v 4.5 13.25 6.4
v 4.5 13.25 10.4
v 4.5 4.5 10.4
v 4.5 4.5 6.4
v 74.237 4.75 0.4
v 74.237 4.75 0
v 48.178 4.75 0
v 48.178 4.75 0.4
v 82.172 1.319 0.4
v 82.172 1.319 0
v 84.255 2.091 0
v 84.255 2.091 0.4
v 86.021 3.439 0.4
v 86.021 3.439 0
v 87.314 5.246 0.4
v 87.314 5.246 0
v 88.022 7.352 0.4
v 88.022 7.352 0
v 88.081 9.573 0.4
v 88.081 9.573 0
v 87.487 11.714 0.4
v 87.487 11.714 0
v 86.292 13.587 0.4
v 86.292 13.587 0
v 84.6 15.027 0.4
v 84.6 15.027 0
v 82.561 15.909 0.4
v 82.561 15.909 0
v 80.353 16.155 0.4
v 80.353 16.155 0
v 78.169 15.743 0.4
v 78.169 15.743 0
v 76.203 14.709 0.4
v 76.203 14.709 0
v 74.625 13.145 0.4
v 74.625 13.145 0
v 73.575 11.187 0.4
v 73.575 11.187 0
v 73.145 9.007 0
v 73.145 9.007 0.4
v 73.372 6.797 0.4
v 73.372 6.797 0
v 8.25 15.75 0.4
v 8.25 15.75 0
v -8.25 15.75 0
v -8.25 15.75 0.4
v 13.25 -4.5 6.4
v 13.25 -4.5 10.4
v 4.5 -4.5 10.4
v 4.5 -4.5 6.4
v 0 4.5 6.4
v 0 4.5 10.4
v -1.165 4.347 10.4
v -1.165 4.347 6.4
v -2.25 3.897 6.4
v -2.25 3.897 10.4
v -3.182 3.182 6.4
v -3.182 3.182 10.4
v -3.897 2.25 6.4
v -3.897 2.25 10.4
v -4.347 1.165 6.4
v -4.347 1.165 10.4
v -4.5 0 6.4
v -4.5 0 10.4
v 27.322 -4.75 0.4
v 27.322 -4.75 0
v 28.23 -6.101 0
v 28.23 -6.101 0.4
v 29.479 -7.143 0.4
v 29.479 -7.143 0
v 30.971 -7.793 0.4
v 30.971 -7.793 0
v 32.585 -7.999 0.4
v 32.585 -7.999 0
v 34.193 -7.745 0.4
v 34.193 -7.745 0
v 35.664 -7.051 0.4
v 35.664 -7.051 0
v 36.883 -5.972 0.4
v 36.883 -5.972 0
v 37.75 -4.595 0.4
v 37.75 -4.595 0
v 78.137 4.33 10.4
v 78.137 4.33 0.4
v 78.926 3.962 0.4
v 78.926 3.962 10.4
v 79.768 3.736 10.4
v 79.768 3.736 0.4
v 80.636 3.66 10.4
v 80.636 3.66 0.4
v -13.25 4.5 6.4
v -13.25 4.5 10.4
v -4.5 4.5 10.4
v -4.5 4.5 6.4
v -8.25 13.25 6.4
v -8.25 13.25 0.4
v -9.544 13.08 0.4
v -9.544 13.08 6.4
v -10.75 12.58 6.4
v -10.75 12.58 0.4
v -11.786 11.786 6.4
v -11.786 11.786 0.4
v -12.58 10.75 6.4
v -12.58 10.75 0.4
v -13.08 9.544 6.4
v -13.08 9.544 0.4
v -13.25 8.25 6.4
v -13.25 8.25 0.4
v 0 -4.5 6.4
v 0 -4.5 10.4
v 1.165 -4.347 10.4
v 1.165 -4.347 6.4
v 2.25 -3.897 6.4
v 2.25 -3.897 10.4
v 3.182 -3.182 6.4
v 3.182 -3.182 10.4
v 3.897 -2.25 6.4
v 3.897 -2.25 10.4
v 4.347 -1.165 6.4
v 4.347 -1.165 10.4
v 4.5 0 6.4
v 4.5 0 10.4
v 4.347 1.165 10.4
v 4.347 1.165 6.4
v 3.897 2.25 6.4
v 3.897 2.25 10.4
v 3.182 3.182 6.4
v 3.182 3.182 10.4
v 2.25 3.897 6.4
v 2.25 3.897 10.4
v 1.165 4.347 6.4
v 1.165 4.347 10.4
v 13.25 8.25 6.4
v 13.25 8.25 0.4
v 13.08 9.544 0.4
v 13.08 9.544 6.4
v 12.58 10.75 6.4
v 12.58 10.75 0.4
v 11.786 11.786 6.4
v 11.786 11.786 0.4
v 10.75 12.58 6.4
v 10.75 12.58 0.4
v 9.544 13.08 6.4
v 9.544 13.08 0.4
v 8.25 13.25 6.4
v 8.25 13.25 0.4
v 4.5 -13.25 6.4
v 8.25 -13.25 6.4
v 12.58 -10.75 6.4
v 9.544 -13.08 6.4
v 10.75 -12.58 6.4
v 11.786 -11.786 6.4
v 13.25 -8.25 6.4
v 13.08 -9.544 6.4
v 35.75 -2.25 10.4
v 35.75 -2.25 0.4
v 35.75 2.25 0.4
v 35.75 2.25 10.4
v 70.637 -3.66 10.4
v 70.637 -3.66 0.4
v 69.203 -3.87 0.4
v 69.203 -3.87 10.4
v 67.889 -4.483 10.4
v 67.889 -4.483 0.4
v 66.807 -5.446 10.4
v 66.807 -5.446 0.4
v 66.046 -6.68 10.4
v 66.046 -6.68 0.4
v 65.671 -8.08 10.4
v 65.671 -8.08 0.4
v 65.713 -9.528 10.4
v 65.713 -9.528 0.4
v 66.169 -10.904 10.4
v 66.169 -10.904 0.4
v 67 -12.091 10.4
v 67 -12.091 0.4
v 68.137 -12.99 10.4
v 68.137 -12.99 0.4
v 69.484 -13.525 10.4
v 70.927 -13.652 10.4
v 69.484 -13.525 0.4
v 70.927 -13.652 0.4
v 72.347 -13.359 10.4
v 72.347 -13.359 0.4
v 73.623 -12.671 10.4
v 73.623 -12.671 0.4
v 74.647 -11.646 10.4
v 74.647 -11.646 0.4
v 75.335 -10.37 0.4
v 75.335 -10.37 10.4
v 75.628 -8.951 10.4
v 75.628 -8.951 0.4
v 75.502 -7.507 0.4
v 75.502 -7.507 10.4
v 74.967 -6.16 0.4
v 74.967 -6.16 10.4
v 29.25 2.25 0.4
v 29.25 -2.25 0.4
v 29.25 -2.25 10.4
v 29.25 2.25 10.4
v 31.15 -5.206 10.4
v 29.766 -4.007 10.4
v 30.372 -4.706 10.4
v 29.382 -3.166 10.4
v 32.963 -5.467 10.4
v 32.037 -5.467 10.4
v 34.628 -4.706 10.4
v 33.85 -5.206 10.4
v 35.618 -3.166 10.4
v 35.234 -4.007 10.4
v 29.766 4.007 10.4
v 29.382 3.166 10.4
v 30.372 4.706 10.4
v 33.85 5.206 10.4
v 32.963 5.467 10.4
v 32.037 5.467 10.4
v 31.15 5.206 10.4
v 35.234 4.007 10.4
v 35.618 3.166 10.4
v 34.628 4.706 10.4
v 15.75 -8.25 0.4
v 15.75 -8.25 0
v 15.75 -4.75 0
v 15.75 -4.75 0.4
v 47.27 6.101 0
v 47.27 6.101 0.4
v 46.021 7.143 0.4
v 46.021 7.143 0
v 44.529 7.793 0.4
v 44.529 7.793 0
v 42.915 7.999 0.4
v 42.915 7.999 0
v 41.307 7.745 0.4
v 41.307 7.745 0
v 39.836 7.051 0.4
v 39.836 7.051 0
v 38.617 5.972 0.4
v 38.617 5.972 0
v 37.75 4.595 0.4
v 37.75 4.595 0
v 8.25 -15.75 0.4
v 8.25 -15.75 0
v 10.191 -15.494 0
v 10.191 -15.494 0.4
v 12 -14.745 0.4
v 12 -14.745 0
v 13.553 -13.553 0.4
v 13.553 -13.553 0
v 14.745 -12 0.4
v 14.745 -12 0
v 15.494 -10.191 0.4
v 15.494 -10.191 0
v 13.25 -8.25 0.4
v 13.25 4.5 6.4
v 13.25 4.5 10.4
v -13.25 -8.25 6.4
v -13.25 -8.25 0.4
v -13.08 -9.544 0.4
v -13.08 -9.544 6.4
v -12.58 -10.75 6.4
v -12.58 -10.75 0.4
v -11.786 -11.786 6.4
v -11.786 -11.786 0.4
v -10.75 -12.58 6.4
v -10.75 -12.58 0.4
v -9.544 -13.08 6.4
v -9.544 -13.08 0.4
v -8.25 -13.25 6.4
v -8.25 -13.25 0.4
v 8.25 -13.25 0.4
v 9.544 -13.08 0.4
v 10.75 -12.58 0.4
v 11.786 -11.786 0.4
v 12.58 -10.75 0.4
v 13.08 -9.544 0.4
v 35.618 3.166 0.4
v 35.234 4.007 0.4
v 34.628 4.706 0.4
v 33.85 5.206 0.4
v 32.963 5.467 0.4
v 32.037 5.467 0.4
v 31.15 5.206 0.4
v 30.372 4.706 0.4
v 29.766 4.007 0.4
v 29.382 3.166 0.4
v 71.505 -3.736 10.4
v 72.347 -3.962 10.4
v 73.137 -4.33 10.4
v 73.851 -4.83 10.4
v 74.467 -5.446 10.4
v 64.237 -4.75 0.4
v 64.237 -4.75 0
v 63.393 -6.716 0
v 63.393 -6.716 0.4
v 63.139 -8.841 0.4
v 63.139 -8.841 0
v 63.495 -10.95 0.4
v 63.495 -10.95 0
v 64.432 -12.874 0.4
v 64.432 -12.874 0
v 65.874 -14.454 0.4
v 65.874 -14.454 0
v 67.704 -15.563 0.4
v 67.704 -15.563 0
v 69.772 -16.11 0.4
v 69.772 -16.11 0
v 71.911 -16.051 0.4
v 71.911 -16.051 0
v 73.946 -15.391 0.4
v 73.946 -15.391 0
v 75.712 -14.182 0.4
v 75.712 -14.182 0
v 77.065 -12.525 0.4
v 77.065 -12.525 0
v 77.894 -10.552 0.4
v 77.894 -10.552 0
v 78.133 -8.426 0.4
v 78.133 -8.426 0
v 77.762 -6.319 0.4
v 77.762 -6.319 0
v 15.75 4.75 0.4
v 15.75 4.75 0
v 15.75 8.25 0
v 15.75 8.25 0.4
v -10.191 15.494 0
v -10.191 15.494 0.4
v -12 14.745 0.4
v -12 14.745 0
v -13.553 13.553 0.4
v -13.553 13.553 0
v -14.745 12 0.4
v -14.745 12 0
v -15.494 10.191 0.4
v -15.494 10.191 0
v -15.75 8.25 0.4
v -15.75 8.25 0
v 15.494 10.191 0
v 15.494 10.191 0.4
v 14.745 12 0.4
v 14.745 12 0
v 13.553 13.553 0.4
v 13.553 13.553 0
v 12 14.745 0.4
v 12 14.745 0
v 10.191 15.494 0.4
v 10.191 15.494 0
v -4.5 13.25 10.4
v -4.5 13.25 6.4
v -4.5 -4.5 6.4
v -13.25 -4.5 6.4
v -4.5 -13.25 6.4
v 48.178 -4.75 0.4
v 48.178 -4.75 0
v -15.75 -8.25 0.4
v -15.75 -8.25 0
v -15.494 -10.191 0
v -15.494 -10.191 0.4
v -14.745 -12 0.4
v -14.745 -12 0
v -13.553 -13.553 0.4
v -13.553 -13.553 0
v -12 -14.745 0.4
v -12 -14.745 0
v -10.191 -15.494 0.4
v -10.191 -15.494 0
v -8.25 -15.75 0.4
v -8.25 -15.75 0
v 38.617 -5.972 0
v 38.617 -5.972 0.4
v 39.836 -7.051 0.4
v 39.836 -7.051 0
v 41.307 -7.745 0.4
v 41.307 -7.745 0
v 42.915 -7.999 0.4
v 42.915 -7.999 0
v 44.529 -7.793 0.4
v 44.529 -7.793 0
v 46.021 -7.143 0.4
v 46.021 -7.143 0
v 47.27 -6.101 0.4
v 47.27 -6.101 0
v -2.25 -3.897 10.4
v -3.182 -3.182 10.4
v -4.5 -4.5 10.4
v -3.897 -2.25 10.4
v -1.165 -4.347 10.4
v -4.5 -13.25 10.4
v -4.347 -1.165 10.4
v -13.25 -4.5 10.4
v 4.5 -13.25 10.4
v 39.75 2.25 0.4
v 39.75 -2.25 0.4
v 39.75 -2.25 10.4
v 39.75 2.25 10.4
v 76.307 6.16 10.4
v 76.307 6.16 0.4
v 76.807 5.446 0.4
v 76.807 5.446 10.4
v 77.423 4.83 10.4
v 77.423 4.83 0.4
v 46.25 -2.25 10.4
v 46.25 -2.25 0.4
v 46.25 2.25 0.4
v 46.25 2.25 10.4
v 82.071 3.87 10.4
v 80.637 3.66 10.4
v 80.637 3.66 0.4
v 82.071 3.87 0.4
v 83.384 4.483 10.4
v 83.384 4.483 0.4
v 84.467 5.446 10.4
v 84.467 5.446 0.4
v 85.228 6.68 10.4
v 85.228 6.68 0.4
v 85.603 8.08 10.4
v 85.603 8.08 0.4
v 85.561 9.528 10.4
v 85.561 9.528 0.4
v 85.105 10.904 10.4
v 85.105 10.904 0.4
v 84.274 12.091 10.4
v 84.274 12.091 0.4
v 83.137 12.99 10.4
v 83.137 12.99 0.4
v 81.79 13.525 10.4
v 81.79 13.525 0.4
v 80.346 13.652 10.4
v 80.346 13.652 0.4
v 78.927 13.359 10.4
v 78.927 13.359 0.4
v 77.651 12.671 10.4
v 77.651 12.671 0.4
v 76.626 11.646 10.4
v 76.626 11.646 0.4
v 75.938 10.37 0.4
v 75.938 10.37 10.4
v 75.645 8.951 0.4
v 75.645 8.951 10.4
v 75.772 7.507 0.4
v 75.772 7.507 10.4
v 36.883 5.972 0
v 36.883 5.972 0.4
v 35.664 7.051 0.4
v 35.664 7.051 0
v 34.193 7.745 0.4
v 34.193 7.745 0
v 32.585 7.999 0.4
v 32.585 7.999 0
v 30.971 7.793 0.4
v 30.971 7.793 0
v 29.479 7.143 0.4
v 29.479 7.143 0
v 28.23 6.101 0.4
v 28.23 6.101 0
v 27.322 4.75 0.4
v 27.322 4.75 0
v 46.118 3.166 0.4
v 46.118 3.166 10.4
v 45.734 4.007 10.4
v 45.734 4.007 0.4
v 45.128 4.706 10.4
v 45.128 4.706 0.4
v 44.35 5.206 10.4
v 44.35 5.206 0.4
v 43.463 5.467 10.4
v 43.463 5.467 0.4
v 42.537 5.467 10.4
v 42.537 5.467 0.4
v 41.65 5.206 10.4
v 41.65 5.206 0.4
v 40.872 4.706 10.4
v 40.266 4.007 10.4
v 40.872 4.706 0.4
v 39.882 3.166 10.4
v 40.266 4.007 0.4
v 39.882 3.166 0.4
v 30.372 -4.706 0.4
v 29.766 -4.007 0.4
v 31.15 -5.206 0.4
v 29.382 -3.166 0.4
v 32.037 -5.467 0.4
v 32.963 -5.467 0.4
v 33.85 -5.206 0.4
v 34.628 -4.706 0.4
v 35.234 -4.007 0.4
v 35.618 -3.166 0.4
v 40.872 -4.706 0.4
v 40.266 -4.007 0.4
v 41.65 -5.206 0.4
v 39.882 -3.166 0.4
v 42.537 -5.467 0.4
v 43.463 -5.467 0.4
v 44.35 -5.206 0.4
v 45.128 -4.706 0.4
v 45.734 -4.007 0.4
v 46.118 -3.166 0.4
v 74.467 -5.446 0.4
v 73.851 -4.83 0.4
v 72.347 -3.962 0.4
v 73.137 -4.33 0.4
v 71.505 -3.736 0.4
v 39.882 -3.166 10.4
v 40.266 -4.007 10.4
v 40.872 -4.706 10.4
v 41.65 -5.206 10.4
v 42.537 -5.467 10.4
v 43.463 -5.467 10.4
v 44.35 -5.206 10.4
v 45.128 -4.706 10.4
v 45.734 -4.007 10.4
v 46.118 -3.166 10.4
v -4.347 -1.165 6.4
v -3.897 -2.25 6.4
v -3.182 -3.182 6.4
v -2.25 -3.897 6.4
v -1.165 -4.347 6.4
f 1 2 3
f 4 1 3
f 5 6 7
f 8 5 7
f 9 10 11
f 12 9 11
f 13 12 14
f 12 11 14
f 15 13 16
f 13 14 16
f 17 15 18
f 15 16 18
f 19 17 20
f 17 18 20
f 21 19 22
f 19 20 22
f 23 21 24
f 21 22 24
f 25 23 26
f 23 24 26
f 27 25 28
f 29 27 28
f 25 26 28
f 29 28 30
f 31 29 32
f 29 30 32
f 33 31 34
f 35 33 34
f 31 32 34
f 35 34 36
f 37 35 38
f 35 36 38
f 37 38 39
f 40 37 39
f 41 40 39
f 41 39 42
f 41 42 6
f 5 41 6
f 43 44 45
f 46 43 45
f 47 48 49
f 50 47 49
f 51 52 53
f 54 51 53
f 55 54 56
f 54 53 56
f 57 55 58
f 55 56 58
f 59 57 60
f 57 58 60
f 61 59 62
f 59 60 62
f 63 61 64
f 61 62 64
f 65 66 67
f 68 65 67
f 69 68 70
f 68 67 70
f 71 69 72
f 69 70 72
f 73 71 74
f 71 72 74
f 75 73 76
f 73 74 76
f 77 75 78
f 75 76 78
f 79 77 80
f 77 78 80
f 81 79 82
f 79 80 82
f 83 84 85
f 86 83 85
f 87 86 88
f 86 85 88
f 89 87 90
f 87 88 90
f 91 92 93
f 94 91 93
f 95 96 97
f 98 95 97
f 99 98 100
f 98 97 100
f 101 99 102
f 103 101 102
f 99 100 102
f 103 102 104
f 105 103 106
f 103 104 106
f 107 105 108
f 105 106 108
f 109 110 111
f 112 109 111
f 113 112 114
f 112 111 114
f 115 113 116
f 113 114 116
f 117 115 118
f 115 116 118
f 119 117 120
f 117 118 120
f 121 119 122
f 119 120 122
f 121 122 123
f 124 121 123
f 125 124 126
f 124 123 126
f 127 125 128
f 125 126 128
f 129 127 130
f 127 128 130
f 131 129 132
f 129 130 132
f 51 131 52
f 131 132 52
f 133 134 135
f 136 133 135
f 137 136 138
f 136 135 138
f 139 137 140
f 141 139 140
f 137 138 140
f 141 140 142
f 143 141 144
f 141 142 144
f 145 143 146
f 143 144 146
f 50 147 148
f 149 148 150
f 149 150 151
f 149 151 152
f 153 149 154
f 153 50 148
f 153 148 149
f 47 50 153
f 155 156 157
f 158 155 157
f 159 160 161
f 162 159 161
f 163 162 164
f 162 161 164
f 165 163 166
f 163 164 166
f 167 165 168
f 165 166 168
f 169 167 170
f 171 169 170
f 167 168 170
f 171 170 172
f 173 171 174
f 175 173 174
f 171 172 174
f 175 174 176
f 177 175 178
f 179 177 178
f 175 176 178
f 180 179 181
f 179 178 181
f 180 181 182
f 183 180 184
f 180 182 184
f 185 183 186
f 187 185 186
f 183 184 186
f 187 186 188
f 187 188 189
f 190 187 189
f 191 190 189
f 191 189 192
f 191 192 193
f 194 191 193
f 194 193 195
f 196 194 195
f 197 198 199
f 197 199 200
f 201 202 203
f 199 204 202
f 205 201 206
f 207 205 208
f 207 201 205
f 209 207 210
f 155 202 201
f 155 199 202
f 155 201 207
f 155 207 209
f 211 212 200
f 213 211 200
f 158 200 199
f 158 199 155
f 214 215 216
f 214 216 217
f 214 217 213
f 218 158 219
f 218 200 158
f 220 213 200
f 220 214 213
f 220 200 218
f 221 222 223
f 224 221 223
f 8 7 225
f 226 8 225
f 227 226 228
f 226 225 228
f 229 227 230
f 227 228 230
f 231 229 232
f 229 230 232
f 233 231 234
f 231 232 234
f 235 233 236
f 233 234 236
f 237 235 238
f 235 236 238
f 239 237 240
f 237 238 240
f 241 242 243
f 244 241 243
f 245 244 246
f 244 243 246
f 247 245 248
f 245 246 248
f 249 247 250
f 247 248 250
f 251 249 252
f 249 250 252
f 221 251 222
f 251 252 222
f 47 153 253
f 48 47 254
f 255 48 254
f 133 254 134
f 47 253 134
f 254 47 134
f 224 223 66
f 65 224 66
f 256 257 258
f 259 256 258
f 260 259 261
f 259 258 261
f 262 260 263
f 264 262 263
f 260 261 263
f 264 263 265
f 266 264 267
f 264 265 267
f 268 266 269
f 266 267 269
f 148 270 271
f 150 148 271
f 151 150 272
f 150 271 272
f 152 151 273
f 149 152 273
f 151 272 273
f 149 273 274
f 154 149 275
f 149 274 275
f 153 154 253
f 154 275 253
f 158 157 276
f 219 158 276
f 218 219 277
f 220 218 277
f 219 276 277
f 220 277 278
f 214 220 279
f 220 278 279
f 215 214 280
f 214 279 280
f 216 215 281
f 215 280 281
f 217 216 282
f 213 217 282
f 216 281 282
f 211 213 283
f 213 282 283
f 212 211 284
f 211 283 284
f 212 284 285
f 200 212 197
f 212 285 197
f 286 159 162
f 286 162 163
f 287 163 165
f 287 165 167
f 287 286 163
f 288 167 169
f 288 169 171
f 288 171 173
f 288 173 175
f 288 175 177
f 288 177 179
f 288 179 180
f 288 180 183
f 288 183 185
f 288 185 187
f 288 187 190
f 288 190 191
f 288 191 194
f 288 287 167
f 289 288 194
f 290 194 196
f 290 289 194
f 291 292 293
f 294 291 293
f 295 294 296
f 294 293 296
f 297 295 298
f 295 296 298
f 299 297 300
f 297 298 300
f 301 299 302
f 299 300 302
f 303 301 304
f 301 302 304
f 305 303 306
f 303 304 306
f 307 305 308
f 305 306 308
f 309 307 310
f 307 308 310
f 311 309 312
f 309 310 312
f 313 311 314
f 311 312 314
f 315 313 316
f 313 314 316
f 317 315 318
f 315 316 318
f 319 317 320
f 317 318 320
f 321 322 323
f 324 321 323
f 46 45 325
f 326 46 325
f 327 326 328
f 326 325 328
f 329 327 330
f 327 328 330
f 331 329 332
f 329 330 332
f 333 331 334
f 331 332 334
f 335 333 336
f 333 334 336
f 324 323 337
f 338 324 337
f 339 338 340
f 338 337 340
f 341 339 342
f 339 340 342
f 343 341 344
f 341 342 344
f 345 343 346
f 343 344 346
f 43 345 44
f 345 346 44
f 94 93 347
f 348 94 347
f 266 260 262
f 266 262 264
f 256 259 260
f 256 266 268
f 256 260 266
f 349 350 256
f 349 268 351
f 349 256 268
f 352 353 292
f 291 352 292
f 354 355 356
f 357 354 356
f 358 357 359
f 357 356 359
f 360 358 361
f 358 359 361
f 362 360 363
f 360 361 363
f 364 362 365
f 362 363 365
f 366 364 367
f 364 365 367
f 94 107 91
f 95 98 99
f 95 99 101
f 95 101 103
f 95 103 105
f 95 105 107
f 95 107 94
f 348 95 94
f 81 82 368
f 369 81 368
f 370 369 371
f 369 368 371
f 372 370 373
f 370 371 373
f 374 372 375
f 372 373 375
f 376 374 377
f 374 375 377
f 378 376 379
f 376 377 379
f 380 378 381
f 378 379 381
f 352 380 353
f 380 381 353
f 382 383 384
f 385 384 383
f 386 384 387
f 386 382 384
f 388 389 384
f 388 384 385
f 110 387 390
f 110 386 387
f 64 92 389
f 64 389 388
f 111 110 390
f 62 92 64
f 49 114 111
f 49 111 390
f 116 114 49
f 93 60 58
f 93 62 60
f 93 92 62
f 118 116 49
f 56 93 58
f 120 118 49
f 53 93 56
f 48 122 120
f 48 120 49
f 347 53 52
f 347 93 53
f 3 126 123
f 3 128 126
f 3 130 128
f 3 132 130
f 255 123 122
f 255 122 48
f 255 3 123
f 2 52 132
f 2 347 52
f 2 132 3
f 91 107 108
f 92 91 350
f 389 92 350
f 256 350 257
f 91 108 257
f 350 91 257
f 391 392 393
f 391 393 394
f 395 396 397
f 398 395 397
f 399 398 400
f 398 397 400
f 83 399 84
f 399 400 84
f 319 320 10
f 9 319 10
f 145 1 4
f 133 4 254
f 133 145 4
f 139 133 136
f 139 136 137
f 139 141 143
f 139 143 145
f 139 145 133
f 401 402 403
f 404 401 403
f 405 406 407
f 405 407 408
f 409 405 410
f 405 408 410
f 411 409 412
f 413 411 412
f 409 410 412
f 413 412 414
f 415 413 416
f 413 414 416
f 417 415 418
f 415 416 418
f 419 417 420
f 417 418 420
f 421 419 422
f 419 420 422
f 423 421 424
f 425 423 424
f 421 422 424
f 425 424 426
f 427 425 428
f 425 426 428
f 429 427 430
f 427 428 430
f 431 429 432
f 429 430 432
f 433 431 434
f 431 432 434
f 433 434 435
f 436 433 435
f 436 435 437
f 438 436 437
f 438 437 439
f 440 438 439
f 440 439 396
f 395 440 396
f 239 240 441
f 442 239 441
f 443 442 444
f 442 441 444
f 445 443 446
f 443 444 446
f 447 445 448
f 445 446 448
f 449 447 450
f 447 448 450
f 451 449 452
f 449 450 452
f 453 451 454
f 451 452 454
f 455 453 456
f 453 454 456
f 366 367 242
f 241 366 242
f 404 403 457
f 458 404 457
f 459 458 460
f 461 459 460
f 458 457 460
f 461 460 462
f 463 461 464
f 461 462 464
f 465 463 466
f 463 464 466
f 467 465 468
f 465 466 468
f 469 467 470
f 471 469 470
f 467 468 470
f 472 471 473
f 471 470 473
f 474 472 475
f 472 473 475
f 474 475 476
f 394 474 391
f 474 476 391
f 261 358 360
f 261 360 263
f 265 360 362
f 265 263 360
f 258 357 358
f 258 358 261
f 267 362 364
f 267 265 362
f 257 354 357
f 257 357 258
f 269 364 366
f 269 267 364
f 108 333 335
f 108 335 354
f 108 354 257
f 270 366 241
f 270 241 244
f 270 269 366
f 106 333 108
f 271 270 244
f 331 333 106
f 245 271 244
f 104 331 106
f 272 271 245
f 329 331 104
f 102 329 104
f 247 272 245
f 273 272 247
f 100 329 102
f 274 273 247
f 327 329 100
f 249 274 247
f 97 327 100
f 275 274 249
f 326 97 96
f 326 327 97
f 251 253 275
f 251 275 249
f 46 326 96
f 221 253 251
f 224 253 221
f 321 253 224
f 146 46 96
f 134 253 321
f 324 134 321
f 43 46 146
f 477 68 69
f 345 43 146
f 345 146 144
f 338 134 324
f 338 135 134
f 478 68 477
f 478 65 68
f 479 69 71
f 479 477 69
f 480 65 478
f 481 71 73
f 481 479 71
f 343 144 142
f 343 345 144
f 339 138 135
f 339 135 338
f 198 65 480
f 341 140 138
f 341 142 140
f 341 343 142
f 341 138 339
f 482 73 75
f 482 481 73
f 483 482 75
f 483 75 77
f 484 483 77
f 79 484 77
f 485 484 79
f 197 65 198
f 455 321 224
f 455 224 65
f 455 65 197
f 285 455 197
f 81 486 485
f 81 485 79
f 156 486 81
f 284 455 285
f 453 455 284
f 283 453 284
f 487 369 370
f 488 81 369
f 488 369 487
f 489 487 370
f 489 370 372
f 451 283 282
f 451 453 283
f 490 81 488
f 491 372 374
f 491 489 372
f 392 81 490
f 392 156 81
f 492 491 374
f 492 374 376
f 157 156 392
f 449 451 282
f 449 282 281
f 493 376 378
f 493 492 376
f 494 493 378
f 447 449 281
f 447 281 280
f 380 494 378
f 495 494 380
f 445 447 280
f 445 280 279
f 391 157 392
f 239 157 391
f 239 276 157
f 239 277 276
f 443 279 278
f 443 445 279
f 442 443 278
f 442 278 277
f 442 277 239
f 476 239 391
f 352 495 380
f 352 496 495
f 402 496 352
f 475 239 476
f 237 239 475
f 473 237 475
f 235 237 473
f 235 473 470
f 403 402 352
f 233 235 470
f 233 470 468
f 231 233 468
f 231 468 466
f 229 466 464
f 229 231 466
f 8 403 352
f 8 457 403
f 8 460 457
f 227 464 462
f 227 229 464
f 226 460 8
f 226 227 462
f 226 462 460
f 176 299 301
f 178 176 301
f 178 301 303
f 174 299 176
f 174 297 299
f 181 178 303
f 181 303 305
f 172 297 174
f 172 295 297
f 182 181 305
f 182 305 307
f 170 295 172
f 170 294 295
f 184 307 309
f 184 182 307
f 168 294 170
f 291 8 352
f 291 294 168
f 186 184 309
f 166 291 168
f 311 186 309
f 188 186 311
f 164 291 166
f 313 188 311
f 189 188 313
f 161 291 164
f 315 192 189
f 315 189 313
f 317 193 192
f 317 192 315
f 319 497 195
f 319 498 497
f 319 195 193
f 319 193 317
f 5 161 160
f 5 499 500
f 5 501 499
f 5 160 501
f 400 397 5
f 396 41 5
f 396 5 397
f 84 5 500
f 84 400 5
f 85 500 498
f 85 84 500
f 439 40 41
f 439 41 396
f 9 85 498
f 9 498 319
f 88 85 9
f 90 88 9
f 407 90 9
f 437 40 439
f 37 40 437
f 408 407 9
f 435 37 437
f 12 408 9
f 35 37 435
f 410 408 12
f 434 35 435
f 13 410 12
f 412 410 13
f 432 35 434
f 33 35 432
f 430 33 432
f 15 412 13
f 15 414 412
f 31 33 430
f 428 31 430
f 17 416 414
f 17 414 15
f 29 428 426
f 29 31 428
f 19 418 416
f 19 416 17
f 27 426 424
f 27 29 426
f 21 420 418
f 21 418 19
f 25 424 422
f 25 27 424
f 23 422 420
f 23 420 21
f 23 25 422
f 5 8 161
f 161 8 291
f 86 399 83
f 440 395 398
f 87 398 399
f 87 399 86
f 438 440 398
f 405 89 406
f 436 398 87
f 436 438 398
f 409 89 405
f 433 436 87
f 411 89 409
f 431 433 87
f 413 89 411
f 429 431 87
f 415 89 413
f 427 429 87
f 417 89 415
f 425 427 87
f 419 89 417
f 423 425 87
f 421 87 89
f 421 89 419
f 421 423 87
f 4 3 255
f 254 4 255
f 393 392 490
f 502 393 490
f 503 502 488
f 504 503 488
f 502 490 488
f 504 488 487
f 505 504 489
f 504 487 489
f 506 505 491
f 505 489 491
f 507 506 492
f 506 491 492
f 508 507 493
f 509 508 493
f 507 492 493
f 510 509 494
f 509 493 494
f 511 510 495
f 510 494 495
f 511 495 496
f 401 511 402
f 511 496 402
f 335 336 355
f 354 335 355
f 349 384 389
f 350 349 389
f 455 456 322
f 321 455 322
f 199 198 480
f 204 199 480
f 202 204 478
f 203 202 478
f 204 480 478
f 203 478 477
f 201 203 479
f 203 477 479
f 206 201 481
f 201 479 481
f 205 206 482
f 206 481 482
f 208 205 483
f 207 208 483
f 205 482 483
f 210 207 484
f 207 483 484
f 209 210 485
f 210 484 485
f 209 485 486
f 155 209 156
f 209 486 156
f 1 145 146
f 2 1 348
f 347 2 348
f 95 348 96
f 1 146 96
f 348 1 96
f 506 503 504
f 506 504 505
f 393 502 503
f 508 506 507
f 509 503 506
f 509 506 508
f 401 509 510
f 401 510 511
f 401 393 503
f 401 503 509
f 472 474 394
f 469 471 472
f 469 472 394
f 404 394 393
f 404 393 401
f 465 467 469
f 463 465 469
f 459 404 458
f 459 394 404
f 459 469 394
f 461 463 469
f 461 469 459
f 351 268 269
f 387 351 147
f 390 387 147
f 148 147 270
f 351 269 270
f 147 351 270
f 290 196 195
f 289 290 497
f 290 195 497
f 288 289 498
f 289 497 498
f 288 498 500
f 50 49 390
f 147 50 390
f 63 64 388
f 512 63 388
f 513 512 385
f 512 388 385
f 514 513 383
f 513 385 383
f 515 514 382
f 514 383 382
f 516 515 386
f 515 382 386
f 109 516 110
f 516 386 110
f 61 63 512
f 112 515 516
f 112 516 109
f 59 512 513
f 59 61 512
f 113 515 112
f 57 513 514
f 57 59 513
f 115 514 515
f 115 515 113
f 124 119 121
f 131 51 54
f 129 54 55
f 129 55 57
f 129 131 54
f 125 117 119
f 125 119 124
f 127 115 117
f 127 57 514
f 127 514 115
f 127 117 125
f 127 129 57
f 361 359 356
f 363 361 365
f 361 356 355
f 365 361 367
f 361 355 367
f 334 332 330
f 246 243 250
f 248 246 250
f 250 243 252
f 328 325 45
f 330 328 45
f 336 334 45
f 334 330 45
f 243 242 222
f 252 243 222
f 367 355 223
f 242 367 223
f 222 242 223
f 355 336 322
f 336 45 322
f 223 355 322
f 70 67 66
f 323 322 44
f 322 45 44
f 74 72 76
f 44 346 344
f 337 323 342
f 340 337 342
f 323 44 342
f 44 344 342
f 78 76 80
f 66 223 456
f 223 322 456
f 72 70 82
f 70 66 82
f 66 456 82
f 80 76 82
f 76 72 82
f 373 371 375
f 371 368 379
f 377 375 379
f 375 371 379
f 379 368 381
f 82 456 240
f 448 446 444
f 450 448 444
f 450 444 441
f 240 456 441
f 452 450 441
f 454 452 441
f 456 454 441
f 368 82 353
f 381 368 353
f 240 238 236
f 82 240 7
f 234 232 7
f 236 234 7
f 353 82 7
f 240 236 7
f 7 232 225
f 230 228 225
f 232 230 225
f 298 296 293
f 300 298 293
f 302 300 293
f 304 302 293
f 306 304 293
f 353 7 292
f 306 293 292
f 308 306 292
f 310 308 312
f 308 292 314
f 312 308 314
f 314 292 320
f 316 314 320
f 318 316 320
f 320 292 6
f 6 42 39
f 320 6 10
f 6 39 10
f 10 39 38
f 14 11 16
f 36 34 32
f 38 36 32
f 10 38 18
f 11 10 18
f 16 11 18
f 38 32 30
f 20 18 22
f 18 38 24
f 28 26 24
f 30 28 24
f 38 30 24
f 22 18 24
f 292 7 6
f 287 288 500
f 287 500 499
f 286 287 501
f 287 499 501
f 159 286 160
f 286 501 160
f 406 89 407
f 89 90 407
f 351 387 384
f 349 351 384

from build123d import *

# Parameters (mm, degrees)
F0_W     = 16
F0_H     = 4.5
F0_W_2   = 6.5
F0_W_3   = 4
F1_DEPTH = 0.4
F2_W     = 6.5
F2_H     = 4.5
F3_DEPTH = 10
F5_DEPTH = 4


with BuildPart() as f1:
    # F0 (on Top) → F1 (new body)
    with BuildSketch(Plane.XY):
        with BuildLine():
            Line((15.75, 4.75), (15.75, 8.25))
            ThreePointArc((15.75, 8.25), (13.5533008589, 13.5533008589), (8.25, 15.75))
            Line((8.25, 15.75), (-8.25, 15.75))
            ThreePointArc((-8.25, 15.75), (-13.5533008589, 13.5533008589), (-15.75, 8.25))
            Line((-15.75, 8.25), (-15.75, -8.25))
            ThreePointArc((-15.75, -8.25), (-13.5533008589, -13.5533008589), (-8.25, -15.75))
            Line((-8.25, -15.75), (8.25, -15.75))
            ThreePointArc((8.25, -15.75), (13.5533008589, -13.5533008589), (15.75, -8.25))
            Line((15.75, -8.25), (15.75, -4.75))
            Line((15.75, -4.75), (27.3219212057, -4.75))
            ThreePointArc((27.3219212057, -4.75), (32.5853423404, -7.9993666334), (37.75, -4.5952078799))
            ThreePointArc((37.75, -4.5952078799), (42.9146576596, -7.9993666334), (48.1780787943, -4.75))
            Line((48.1780787943, -4.75), (64.2367581147, -4.75))
            ThreePointArc((64.2367581147, -4.75), (69.772491367, -16.1102912652), (77.7619633367, -6.3190248551))
            Line((77.7619633367, -6.3190248551), (82.171793393, 1.3190248551))
            ThreePointArc((82.171793393, 1.3190248551), (83.6132988623, 15.5443055254), (74.2367581147, 4.75))
            Line((74.2367581147, 4.75), (48.1780787943, 4.75))
            ThreePointArc((48.1780787943, 4.75), (42.9146576596, 7.9993666334), (37.75, 4.5952078799))
            ThreePointArc((37.75, 4.5952078799), (32.5853423404, 7.9993666334), (27.3219212057, 4.75))
            Line((27.3219212057, 4.75), (15.75, 4.75))
        make_face()
        with BuildLine():
            ThreePointArc((-13.25, 8.25), (-11.7855339059, 11.7855339059), (-8.25, 13.25))
            Line((-8.25, 13.25), (-4.5, 13.25))
            Line((-4.5, 13.25), (4.5, 13.25))
            Line((4.5, 13.25), (8.25, 13.25))
            ThreePointArc((8.25, 13.25), (11.7855339059, 11.7855339059), (13.25, 8.25))
            Line((13.25, 8.25), (13.25, 4.5))
            Line((13.25, 4.5), (13.25, 2.25))
            Line((13.25, 2.25), (29.25, 2.25))
            ThreePointArc((29.25, 2.25), (32.5, 5.5), (35.75, 2.25))
            Line((35.75, 2.25), (39.75, 2.25))
            ThreePointArc((39.75, 2.25), (43, 5.5), (46.25, 2.25))
            Line((46.25, 2.25), (74.0490381057, 2.25))
            Line((74.0490381057, 2.25), (76.306624327, 6.1602540378))
            ThreePointArc((76.306624327, 6.1602540378), (83.1367513459, 12.9903810568), (80.6367513459, 3.6602540378))
            Line((80.6367513459, 3.6602540378), (74.9668783649, -6.1602540378))
            ThreePointArc((74.9668783649, -6.1602540378), (68.1367513459, -12.9903810568), (70.6367513459, -3.6602540378))
            Line((70.6367513459, -3.6602540378), (71.4509618943, -2.25))
            Line((71.4509618943, -2.25), (46.25, -2.25))
            ThreePointArc((46.25, -2.25), (43, -5.5), (39.75, -2.25))
            Line((39.75, -2.25), (35.75, -2.25))
            ThreePointArc((35.75, -2.25), (32.5, -5.5), (29.25, -2.25))
            Line((29.25, -2.25), (13.25, -2.25))
            Line((13.25, -2.25), (13.25, -4.5))
            Line((13.25, -4.5), (13.25, -8.25))
            ThreePointArc((13.25, -8.25), (11.7855339059, -11.7855339059), (8.25, -13.25))
            Line((8.25, -13.25), (4.5, -13.25))
            Line((4.5, -13.25), (-4.5, -13.25))
            Line((-4.5, -13.25), (-8.25, -13.25))
            ThreePointArc((-8.25, -13.25), (-11.7855339059, -11.7855339059), (-13.25, -8.25))
            Line((-13.25, -8.25), (-13.25, -4.5))
            Line((-13.25, -4.5), (-13.25, 4.5))
            Line((-13.25, 4.5), (-13.25, 8.25))
        make_face(mode=Mode.SUBTRACT)
        Polygon((74.0490381057, 2.25), (46.25, 2.25), (46.25, -2.25), (71.4509618943, -2.25), align=None)
        Polygon((13.25, 4.5), (4.5, 4.5), (4.5, 0), (4.5, -4.5), (13.25, -4.5), (13.25, -2.25), (13.25, 2.25), align=None)
        Polygon((-4.5, 0), (-4.5, 4.5), (-13.25, 4.5), (-13.25, -4.5), (-4.5, -4.5), align=None)
        Polygon((4.5, -4.5), (0, -4.5), (-4.5, -4.5), (-4.5, -13.25), (4.5, -13.25), align=None)
        Polygon((4.5, 13.25), (-4.5, 13.25), (-4.5, 4.5), (0, 4.5), (4.5, 4.5), align=None)
        with BuildLine():
            ThreePointArc((74.9668783649, -6.1602540378), (73.1367513459, -4.3301270189), (70.6367513459, -3.6602540378))
            ThreePointArc((70.6367513459, -3.6602540378), (68.1367513459, -12.9903810568), (74.9668783649, -6.1602540378))
        make_face()
        with BuildLine():
            ThreePointArc((80.6367513459, 3.6602540378), (83.1367513459, 12.9903810568), (76.306624327, 6.1602540378))
            ThreePointArc((76.306624327, 6.1602540378), (78.1363307509, 4.3303698768), (80.6357799962, 3.6602541322))
            ThreePointArc((80.6357799962, 3.6602541322), (80.6362656711, 3.6602540614), (80.6367513459, 3.6602540378))
        make_face()
        with Locations((21.25, 0)):
            Rectangle(F0_W, F0_H)
        with BuildLine():
            Line((-4.5, -4.5), (-13.25, -4.5))
            Line((-13.25, -4.5), (-13.25, -8.25))
            ThreePointArc((-13.25, -8.25), (-11.7855339059, -11.7855339059), (-8.25, -13.25))
            Line((-8.25, -13.25), (-4.5, -13.25))
            Line((-4.5, -13.25), (-4.5, -4.5))
        make_face()
        with BuildLine():
            Line((13.25, -4.5), (4.5, -4.5))
            Line((4.5, -4.5), (4.5, -13.25))
            Line((4.5, -13.25), (8.25, -13.25))
            ThreePointArc((8.25, -13.25), (11.7855339059, -11.7855339059), (13.25, -8.25))
            Line((13.25, -8.25), (13.25, -4.5))
        make_face()
        with BuildLine():
            Line((8.25, 13.25), (4.5, 13.25))
            Line((4.5, 13.25), (4.5, 4.5))
            Line((4.5, 4.5), (13.25, 4.5))
            Line((13.25, 4.5), (13.25, 8.25))
            ThreePointArc((13.25, 8.25), (11.7855339059, 11.7855339059), (8.25, 13.25))
        make_face()
        with BuildLine():
            Line((-4.5, 13.25), (-8.25, 13.25))
            ThreePointArc((-8.25, 13.25), (-11.7855339059, 11.7855339059), (-13.25, 8.25))
            Line((-13.25, 8.25), (-13.25, 4.5))
            Line((-13.25, 4.5), (-4.5, 4.5))
            Line((-4.5, 4.5), (-4.5, 13.25))
        make_face()
        with BuildLine():
            ThreePointArc((0, 4.5), (-3.1819805153, 3.1819805153), (-4.5, 0))
            ThreePointArc((-4.5, 0), (-3.1819805153, -3.1819805153), (0, -4.5))
            ThreePointArc((0, -4.5), (3.1819805153, -3.1819805153), (4.5, 0))
            ThreePointArc((4.5, 0), (3.1819805153, 3.1819805153), (0, 4.5))
        make_face()
        with BuildLine():
            Line((76.306624327, 6.1602540378), (74.0490381057, 2.25))
            Line((74.0490381057, 2.25), (71.4509618943, -2.25))
            Line((71.4509618943, -2.25), (70.6367513459, -3.6602540378))
            ThreePointArc((70.6367513459, -3.6602540378), (73.1367513459, -4.3301270189), (74.9668783649, -6.1602540378))
            Line((74.9668783649, -6.1602540378), (80.6367513459, 3.6602540378))
            ThreePointArc((80.6367513459, 3.6602540378), (80.6362656711, 3.6602540614), (80.6357799962, 3.6602541322))
            ThreePointArc((80.6357799962, 3.6602541322), (78.1363307509, 4.3303698768), (76.306624327, 6.1602540378))
        make_face()
        with Locations((32.5, 0)):
            Rectangle(F0_W_2, F0_H)
        with Locations((43, 0)):
            Rectangle(F0_W_2, F0_H)
        with Locations((37.75, 0)):
            Rectangle(F0_W_3, F0_H)
        with BuildLine():
            ThreePointArc((35.75, 2.25), (32.5, 5.5), (29.25, 2.25))
            Line((29.25, 2.25), (35.75, 2.25))
        make_face()
        with BuildLine():
            ThreePointArc((46.25, 2.25), (43, 5.5), (39.75, 2.25))
            Line((39.75, 2.25), (46.25, 2.25))
        make_face()
        with BuildLine():
            Line((35.75, -2.25), (29.25, -2.25))
            ThreePointArc((29.25, -2.25), (32.5, -5.5), (35.75, -2.25))
        make_face()
        with BuildLine():
            Line((46.25, -2.25), (39.75, -2.25))
            ThreePointArc((39.75, -2.25), (43, -5.5), (46.25, -2.25))
        make_face()
        with BuildLine():
            ThreePointArc((0, -4.5), (-3.1819805153, -3.1819805153), (-4.5, 0))
            Line((-4.5, 0), (-4.5, -4.5))
            Line((-4.5, -4.5), (0, -4.5))
        make_face()
        with BuildLine():
            Line((0, 4.5), (-4.5, 4.5))
            Line((-4.5, 4.5), (-4.5, 0))
            ThreePointArc((-4.5, 0), (-3.1819805153, 3.1819805153), (0, 4.5))
        make_face()
        with BuildLine():
            Line((4.5, 0), (4.5, 4.5))
            Line((4.5, 4.5), (0, 4.5))
            ThreePointArc((0, 4.5), (3.1819805153, 3.1819805153), (4.5, 0))
        make_face()
        with BuildLine():
            Line((4.5, -4.5), (4.5, 0))
            ThreePointArc((4.5, 0), (3.1819805153, -3.1819805153), (0, -4.5))
            Line((0, -4.5), (4.5, -4.5))
        make_face()
    extrude(amount=F1_DEPTH)

    # F2 (on face) → F3 (join)
    with BuildSketch(Plane.XY.offset(0.4)):
        Polygon((-4.5, 0), (-4.5, 4.5), (-13.25, 4.5), (-13.25, -4.5), (-4.5, -4.5), align=None)
        with BuildLine():
            ThreePointArc((35.75, 2.25), (32.5, 5.5), (29.25, 2.25))
            Line((29.25, 2.25), (35.75, 2.25))
        make_face()
        with Locations((32.5, 0)):
            Rectangle(F2_W, F2_H)
        with BuildLine():
            Line((35.75, -2.25), (29.25, -2.25))
            ThreePointArc((29.25, -2.25), (32.5, -5.5), (35.75, -2.25))
        make_face()
        with BuildLine():
            Line((-4.5, -4.5), (-13.25, -4.5))
            Line((-13.25, -4.5), (-13.25, -8.25))
            ThreePointArc((-13.25, -8.25), (-11.7855339059, -11.7855339059), (-8.25, -13.25))
            Line((-8.25, -13.25), (-4.5, -13.25))
            Line((-4.5, -13.25), (-4.5, -4.5))
        make_face()
        Polygon((4.5, -4.5), (0, -4.5), (-4.5, -4.5), (-4.5, -13.25), (4.5, -13.25), align=None)
        with BuildLine():
            Line((13.25, -4.5), (4.5, -4.5))
            Line((4.5, -4.5), (4.5, -13.25))
            Line((4.5, -13.25), (8.25, -13.25))
            ThreePointArc((8.25, -13.25), (11.7855339059, -11.7855339059), (13.25, -8.25))
            Line((13.25, -8.25), (13.25, -4.5))
        make_face()
        Polygon((13.25, 4.5), (4.5, 4.5), (4.5, 0), (4.5, -4.5), (13.25, -4.5), (13.25, -2.25), (13.25, 2.25), align=None)
        with BuildLine():
            ThreePointArc((0, 4.5), (-3.1819805153, 3.1819805153), (-4.5, 0))
            ThreePointArc((-4.5, 0), (-3.1819805153, -3.1819805153), (0, -4.5))
            ThreePointArc((0, -4.5), (3.1819805153, -3.1819805153), (4.5, 0))
            ThreePointArc((4.5, 0), (3.1819805153, 3.1819805153), (0, 4.5))
        make_face()
        with BuildLine():
            Line((4.5, -4.5), (4.5, 0))
            ThreePointArc((4.5, 0), (3.1819805153, -3.1819805153), (0, -4.5))
            Line((0, -4.5), (4.5, -4.5))
        make_face()
        with BuildLine():
            ThreePointArc((0, -4.5), (-3.1819805153, -3.1819805153), (-4.5, 0))
            Line((-4.5, 0), (-4.5, -4.5))
            Line((-4.5, -4.5), (0, -4.5))
        make_face()
        with BuildLine():
            Line((0, 4.5), (-4.5, 4.5))
            Line((-4.5, 4.5), (-4.5, 0))
            ThreePointArc((-4.5, 0), (-3.1819805153, 3.1819805153), (0, 4.5))
        make_face()
        Polygon((4.5, 13.25), (-4.5, 13.25), (-4.5, 4.5), (0, 4.5), (4.5, 4.5), align=None)
        with BuildLine():
            Line((-4.5, 13.25), (-8.25, 13.25))
            ThreePointArc((-8.25, 13.25), (-11.7855339059, 11.7855339059), (-13.25, 8.25))
            Line((-13.25, 8.25), (-13.25, 4.5))
            Line((-13.25, 4.5), (-4.5, 4.5))
            Line((-4.5, 4.5), (-4.5, 13.25))
        make_face()
        with BuildLine():
            Line((8.25, 13.25), (4.5, 13.25))
            Line((4.5, 13.25), (4.5, 4.5))
            Line((4.5, 4.5), (13.25, 4.5))
            Line((13.25, 4.5), (13.25, 8.25))
            ThreePointArc((13.25, 8.25), (11.7855339059, 11.7855339059), (8.25, 13.25))
        make_face()
        with BuildLine():
            Line((4.5, 0), (4.5, 4.5))
            Line((4.5, 4.5), (0, 4.5))
            ThreePointArc((0, 4.5), (3.1819805153, 3.1819805153), (4.5, 0))
        make_face()
        with Locations((43, 0)):
            Rectangle(F2_W, F2_H)
        with BuildLine():
            ThreePointArc((46.25, 2.25), (43, 5.5), (39.75, 2.25))
            Line((39.75, 2.25), (46.25, 2.25))
        make_face()
        with BuildLine():
            Line((46.25, -2.25), (39.75, -2.25))
            ThreePointArc((39.75, -2.25), (43, -5.5), (46.25, -2.25))
        make_face()
        with BuildLine():
            ThreePointArc((73.1367513459, -4.3301270189), (71.9308465715, -3.8306249064), (70.6367513459, -3.6602540378))
            ThreePointArc((70.6367513459, -3.6602540378), (68.1367513459, -12.9903810568), (74.9668783649, -6.1602540378))
            ThreePointArc((74.9668783649, -6.1602540378), (74.1722852519, -5.1247201319), (73.1367513459, -4.3301270189))
        make_face()
        with BuildLine():
            ThreePointArc((80.6367513459, 3.6602540378), (83.1367513459, 12.9903810568), (76.306624327, 6.1602540378))
            ThreePointArc((76.306624327, 6.1602540378), (77.10121744, 5.1247201319), (78.1367513459, 4.3301270189))
            ThreePointArc((78.1367513459, 4.3301270189), (79.3421870006, 3.8307506311), (80.6357799962, 3.6602541322))
            ThreePointArc((80.6357799962, 3.6602541322), (80.6362656711, 3.6602540614), (80.6367513459, 3.6602540378))
        make_face()
    extrude(amount=F3_DEPTH)

    # F4 (on face) → F5 (cut)
    with BuildSketch(Plane.XY.offset(10.4)):
        with BuildLine():
            Line((13.25, -4.5), (4.5, -4.5))
            Line((4.5, -4.5), (4.5, -13.25))
            Line((4.5, -13.25), (8.25, -13.25))
            ThreePointArc((8.25, -13.25), (11.7855339059, -11.7855339059), (13.25, -8.25))
            Line((13.25, -8.25), (13.25, -4.5))
        make_face()
        with BuildLine():
            Line((-4.5, -4.5), (-13.25, -4.5))
            Line((-13.25, -4.5), (-13.25, -8.25))
            ThreePointArc((-13.25, -8.25), (-11.7855339059, -11.7855339059), (-8.25, -13.25))
            Line((-8.25, -13.25), (-4.5, -13.25))
            Line((-4.5, -13.25), (-4.5, -4.5))
        make_face()
        with BuildLine():
            Line((-4.5, 13.25), (-8.25, 13.25))
            ThreePointArc((-8.25, 13.25), (-11.7855339059, 11.7855339059), (-13.25, 8.25))
            Line((-13.25, 8.25), (-13.25, 4.5))
            Line((-13.25, 4.5), (-4.5, 4.5))
            Line((-4.5, 4.5), (-4.5, 13.25))
        make_face()
        with BuildLine():
            Line((8.25, 13.25), (4.5, 13.25))
            Line((4.5, 13.25), (4.5, 4.5))
            Line((4.5, 4.5), (13.25, 4.5))
            Line((13.25, 4.5), (13.25, 8.25))
            ThreePointArc((13.25, 8.25), (11.7855339059, 11.7855339059), (8.25, 13.25))
        make_face()
        with BuildLine():
            ThreePointArc((0, 4.5), (-3.1819805153, 3.1819805153), (-4.5, 0))
            ThreePointArc((-4.5, 0), (-3.1819805153, -3.1819805153), (0, -4.5))
            ThreePointArc((0, -4.5), (3.1819805153, -3.1819805153), (4.5, 0))
            ThreePointArc((4.5, 0), (3.1819805153, 3.1819805153), (0, 4.5))
        make_face()
    extrude(amount=-F5_DEPTH, mode=Mode.SUBTRACT)


solid = f1.part
